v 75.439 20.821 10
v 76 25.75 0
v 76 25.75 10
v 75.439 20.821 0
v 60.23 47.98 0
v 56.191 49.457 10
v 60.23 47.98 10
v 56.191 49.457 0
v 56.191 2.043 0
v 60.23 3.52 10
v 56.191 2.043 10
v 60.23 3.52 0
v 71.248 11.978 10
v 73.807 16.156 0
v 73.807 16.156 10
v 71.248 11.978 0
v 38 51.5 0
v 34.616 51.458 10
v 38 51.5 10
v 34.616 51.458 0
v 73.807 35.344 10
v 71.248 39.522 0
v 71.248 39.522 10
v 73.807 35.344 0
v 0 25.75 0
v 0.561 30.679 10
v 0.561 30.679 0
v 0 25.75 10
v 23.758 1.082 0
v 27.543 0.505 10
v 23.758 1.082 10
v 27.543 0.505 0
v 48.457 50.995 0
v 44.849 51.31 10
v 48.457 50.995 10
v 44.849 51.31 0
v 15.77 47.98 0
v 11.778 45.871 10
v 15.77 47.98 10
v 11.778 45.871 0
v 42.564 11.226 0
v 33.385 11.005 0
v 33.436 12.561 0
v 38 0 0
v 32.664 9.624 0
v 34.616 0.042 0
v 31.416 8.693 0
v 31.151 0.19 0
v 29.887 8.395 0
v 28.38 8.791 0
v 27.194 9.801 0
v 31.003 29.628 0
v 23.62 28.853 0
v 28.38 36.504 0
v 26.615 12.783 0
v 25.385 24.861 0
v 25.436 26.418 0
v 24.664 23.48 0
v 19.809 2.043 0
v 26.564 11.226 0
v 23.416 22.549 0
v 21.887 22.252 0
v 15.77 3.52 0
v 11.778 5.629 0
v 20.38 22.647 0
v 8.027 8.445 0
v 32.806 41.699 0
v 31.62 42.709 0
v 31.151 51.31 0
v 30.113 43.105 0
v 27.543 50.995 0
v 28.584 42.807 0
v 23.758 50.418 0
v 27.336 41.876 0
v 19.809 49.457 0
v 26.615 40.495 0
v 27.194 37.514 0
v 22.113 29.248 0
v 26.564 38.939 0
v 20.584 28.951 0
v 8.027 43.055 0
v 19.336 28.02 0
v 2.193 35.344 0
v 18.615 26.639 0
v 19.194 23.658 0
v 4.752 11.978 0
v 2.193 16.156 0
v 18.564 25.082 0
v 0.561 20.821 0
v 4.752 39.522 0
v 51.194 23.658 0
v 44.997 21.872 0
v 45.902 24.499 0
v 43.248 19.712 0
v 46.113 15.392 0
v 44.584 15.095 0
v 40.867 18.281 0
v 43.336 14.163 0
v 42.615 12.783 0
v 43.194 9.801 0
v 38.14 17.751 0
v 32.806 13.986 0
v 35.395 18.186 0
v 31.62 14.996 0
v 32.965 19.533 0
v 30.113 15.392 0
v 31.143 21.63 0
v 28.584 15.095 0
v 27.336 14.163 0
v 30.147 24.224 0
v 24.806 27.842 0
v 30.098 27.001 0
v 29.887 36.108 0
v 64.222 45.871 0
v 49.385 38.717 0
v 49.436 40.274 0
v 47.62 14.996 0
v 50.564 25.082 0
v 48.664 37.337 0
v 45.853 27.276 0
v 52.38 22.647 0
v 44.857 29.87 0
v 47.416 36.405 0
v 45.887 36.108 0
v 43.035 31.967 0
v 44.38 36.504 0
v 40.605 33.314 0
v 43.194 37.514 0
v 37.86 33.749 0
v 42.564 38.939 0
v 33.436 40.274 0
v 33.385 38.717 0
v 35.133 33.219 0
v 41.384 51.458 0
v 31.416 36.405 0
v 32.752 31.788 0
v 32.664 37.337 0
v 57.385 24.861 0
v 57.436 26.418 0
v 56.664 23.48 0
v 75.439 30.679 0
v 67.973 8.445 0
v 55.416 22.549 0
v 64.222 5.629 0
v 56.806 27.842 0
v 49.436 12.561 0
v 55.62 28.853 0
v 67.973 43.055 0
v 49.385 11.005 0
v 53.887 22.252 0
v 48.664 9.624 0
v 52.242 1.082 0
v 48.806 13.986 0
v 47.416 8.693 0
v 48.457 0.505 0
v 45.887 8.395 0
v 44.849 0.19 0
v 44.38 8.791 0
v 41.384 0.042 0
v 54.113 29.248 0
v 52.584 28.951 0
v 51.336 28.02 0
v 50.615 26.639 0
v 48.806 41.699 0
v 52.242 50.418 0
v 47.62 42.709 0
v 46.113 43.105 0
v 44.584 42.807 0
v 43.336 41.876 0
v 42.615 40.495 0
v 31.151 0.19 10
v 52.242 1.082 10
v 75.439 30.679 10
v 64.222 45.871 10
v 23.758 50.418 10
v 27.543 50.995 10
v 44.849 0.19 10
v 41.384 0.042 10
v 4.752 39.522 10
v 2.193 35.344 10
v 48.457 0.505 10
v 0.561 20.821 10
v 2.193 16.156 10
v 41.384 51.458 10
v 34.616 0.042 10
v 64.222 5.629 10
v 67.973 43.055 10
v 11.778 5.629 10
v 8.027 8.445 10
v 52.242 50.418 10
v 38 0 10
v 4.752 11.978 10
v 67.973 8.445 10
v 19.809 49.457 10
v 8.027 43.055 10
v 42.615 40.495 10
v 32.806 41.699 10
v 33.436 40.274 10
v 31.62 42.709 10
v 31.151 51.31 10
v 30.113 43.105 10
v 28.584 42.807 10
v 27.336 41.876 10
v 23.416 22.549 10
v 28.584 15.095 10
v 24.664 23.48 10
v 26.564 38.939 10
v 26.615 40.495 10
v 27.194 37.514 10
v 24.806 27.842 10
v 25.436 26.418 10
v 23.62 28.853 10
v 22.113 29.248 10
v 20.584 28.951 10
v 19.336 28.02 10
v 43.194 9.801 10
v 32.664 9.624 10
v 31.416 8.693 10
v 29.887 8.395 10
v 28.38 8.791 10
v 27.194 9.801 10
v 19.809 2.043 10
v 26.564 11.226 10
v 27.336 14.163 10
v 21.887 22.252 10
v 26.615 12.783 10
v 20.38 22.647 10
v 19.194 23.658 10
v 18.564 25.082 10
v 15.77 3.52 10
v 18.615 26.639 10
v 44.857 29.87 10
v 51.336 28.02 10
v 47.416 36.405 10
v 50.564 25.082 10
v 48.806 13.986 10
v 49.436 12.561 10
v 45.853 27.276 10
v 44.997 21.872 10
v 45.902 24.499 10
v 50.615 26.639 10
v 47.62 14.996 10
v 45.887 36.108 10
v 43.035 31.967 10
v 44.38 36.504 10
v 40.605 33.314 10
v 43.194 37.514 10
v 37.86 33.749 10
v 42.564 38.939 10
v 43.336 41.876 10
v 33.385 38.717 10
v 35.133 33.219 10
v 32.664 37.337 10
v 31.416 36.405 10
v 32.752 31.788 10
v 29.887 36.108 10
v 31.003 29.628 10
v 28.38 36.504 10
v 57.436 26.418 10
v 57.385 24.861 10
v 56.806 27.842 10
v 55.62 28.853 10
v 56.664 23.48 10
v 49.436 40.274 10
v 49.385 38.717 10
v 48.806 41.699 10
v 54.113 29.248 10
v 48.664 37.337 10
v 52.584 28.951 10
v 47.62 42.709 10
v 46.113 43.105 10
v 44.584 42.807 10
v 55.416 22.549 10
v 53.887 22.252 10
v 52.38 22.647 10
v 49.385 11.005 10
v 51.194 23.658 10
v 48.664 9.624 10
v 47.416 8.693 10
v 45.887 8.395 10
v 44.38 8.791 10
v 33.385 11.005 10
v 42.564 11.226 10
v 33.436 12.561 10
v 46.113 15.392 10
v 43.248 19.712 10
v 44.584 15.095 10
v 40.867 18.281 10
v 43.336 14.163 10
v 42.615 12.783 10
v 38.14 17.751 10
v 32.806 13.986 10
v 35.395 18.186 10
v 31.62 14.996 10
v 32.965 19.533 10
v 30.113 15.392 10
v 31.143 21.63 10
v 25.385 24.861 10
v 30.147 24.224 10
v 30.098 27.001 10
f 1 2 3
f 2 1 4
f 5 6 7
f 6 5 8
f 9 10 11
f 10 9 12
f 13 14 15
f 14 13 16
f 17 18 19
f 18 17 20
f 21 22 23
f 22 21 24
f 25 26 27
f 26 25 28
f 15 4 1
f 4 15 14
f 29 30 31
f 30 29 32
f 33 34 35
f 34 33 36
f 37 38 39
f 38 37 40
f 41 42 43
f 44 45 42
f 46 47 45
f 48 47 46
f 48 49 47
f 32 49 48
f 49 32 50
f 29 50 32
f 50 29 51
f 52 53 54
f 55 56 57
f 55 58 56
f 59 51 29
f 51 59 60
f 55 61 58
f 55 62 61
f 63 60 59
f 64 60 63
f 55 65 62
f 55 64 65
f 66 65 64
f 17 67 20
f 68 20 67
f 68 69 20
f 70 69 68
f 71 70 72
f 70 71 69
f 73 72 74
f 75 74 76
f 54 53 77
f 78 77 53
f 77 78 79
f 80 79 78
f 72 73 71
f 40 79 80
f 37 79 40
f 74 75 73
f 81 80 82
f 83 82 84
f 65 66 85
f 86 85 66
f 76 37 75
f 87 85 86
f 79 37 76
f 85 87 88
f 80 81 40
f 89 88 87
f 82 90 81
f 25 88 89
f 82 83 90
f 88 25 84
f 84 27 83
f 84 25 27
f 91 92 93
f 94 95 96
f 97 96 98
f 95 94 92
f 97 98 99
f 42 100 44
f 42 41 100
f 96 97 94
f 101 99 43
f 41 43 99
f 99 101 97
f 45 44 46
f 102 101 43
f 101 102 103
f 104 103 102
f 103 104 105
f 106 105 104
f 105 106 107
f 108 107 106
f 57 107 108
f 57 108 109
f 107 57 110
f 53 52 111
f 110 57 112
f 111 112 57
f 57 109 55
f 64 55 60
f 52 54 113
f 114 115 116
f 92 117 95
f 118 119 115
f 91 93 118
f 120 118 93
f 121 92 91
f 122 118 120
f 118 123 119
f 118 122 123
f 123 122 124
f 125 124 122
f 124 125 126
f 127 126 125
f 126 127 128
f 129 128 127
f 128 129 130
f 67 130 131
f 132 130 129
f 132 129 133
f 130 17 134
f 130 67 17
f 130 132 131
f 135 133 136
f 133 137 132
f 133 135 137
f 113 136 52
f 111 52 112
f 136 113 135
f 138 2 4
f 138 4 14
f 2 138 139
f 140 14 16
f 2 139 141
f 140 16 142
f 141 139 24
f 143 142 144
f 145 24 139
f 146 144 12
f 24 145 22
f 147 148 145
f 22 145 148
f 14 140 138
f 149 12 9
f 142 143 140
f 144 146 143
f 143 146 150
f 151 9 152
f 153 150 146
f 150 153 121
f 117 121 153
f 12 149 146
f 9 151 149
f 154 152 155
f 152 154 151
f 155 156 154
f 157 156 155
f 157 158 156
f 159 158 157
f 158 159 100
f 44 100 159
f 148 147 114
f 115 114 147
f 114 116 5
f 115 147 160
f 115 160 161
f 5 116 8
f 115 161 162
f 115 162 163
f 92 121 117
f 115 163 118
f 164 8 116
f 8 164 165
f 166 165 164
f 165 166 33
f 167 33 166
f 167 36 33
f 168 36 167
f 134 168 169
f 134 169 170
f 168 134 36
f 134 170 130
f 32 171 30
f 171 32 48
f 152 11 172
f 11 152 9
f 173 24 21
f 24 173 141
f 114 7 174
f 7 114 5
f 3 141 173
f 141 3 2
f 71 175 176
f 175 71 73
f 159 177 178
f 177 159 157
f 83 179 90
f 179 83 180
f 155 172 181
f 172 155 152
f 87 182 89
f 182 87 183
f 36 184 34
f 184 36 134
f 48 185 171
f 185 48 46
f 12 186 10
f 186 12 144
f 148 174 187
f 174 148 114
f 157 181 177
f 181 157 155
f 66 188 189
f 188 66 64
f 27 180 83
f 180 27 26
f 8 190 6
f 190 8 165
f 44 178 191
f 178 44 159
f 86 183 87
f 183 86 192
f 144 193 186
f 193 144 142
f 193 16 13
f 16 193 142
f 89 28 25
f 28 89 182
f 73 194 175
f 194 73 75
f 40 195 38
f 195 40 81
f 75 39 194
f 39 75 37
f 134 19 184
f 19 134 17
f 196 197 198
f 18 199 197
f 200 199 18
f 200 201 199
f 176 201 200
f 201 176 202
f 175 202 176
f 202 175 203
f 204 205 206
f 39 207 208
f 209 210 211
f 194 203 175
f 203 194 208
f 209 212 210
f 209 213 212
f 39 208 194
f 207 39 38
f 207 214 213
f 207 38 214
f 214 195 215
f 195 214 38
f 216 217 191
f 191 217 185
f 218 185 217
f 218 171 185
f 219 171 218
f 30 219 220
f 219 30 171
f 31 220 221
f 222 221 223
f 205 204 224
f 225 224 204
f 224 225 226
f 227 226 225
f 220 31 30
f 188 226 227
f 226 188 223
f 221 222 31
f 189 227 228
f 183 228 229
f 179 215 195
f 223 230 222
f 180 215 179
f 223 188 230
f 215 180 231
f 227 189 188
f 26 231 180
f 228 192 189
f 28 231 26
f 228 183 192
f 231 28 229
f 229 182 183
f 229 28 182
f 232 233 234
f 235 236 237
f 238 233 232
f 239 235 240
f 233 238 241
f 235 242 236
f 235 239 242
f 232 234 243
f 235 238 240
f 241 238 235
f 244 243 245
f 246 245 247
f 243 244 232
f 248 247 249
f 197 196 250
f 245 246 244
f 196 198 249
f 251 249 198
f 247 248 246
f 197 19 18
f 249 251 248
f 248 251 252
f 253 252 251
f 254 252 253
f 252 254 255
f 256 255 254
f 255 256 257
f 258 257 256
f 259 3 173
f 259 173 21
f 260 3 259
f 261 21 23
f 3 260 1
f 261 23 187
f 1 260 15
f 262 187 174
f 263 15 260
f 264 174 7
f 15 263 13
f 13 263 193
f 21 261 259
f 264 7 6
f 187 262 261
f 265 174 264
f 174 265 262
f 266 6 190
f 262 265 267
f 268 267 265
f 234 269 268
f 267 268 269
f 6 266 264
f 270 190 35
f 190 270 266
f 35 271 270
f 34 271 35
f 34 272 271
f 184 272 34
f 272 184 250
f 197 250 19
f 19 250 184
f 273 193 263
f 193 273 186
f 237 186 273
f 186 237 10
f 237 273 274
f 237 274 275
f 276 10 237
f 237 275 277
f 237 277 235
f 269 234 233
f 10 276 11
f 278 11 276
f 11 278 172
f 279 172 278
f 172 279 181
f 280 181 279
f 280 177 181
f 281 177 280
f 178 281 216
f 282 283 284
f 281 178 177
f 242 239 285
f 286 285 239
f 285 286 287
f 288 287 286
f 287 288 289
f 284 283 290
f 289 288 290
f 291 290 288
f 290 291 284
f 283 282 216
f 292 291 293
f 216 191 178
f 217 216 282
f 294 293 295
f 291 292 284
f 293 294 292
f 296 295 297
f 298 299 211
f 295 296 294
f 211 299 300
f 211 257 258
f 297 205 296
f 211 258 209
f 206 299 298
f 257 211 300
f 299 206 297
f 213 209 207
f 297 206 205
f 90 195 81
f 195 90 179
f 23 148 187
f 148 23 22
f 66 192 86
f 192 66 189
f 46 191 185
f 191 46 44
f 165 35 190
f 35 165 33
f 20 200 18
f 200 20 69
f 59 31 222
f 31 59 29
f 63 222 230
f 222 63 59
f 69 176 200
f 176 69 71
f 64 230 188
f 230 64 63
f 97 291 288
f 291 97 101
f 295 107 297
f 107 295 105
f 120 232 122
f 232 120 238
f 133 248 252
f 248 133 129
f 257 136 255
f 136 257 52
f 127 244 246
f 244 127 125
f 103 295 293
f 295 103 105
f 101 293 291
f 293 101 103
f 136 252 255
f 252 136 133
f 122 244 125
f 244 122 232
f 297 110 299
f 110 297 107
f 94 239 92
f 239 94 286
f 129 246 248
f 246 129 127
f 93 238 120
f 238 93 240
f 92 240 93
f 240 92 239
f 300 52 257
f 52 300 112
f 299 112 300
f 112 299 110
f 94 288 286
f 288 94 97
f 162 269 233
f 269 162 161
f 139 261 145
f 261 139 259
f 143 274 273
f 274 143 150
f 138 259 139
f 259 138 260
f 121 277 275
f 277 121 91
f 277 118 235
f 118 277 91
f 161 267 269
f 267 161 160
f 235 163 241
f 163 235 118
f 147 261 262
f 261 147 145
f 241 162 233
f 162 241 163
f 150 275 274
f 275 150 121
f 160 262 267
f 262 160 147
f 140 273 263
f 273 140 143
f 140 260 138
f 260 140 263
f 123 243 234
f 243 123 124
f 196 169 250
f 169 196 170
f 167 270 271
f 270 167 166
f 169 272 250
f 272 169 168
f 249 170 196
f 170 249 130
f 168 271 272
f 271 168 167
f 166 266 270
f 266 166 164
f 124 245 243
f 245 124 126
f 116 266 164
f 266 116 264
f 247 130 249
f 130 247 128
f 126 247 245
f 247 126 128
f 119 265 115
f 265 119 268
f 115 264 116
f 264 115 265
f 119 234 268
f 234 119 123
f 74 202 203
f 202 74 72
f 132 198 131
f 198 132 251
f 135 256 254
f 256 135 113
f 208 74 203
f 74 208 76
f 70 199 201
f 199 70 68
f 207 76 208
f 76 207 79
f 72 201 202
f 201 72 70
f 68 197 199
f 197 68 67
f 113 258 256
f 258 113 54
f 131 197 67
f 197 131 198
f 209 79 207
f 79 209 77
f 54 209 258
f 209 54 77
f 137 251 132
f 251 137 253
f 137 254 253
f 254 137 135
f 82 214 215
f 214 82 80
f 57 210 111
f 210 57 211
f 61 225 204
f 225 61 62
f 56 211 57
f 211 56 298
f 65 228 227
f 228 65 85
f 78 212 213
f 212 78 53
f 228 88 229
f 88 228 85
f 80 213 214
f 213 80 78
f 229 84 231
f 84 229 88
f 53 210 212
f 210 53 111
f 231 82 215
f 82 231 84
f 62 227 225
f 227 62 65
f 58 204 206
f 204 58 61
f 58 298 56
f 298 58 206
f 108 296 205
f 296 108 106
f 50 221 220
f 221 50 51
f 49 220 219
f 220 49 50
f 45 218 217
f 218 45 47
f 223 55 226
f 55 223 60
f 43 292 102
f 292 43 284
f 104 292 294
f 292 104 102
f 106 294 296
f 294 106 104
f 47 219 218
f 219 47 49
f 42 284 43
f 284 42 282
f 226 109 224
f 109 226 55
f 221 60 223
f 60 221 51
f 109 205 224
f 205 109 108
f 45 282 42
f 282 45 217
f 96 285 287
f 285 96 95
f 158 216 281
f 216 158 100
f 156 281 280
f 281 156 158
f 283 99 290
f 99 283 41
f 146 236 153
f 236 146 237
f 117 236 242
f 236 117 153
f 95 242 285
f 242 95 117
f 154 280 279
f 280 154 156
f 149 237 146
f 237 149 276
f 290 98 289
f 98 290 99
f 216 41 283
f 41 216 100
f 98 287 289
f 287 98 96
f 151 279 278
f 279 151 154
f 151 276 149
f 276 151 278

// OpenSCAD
$fn = 32;

// ----------------------------------------------------------------------
// Cam plate: double_lobe cam, base R24
// ----------------------------------------------------------------------

// --- parameters (mm) ---
base_r = 24;              // base circle radius
lobe_h = 14;              // cam lobe rise
bore_r = 8;               // shaft bore radius
plate_t = 10;             // plate thickness, Z (extrusion height)
ring_r = 16;              // lightening ring radius
bolt_r = 3.5;             // lightening hole radius

profile = [[76, 25.75], [75.439, 30.679], [73.807, 35.344], [71.248, 39.522], [67.973, 43.055], [64.222, 45.871], [60.23, 47.98], [56.191, 49.457], [52.242, 50.418], [48.457, 50.995], [44.849, 51.31], [41.384, 51.458], [38, 51.5], [34.616, 51.458], [31.151, 51.31], [27.543, 50.995], [23.758, 50.418], [19.809, 49.457], [15.77, 47.98], [11.778, 45.871], [8.027, 43.055], [4.752, 39.522], [2.193, 35.344], [0.561, 30.679], [0, 25.75], [0.561, 20.821], [2.193, 16.156], [4.752, 11.978], [8.027, 8.445], [11.778, 5.629], [15.77, 3.52], [19.809, 2.043], [23.758, 1.082], [27.543, 0.505], [31.151, 0.19], [34.616, 0.042], [38, 0], [41.384, 0.042], [44.849, 0.19], [48.457, 0.505], [52.242, 1.082], [56.191, 2.043], [60.23, 3.52], [64.222, 5.629], [67.973, 8.445], [71.248, 11.978], [73.807, 16.156], [75.439, 20.821]];  // primary outline, 48 points, counter clockwise
void_1 = [[45.853, 27.276], [44.857, 29.87], [43.035, 31.967], [40.605, 33.314], [37.86, 33.749], [35.133, 33.219], [32.752, 31.788], [31.003, 29.628], [30.098, 27.001], [30.147, 24.224], [31.143, 21.63], [32.965, 19.533], [35.395, 18.186], [38.14, 17.751], [40.867, 18.281], [43.248, 19.712], [44.997, 21.872], [45.902, 24.499]];  // shaft bore, 18 points
void_2 = [[57.436, 26.418], [56.806, 27.842], [55.62, 28.853], [54.113, 29.248], [52.584, 28.951], [51.336, 28.02], [50.615, 26.639], [50.564, 25.082], [51.194, 23.658], [52.38, 22.647], [53.887, 22.252], [55.416, 22.549], [56.664, 23.48], [57.385, 24.861]];  // lightening hole 1, 14 points
void_3 = [[49.436, 40.274], [48.806, 41.699], [47.62, 42.709], [46.113, 43.105], [44.584, 42.807], [43.336, 41.876], [42.615, 40.495], [42.564, 38.939], [43.194, 37.514], [44.38, 36.504], [45.887, 36.108], [47.416, 36.405], [48.664, 37.337], [49.385, 38.717]];  // lightening hole 2, 14 points
void_4 = [[33.436, 40.274], [32.806, 41.699], [31.62, 42.709], [30.113, 43.105], [28.584, 42.807], [27.336, 41.876], [26.615, 40.495], [26.564, 38.939], [27.194, 37.514], [28.38, 36.504], [29.887, 36.108], [31.416, 36.405], [32.664, 37.337], [33.385, 38.717]];  // lightening hole 3, 14 points
void_5 = [[25.436, 26.418], [24.806, 27.842], [23.62, 28.853], [22.113, 29.248], [20.584, 28.951], [19.336, 28.02], [18.615, 26.639], [18.564, 25.082], [19.194, 23.658], [20.38, 22.647], [21.887, 22.252], [23.416, 22.549], [24.664, 23.48], [25.385, 24.861]];  // lightening hole 4, 14 points
void_6 = [[33.436, 12.561], [32.806, 13.986], [31.62, 14.996], [30.113, 15.392], [28.584, 15.095], [27.336, 14.163], [26.615, 12.783], [26.564, 11.226], [27.194, 9.801], [28.38, 8.791], [29.887, 8.395], [31.416, 8.693], [32.664, 9.624], [33.385, 11.005]];  // lightening hole 5, 14 points
void_7 = [[49.436, 12.561], [48.806, 13.986], [47.62, 14.996], [46.113, 15.392], [44.584, 15.095], [43.336, 14.163], [42.615, 12.783], [42.564, 11.226], [43.194, 9.801], [44.38, 8.791], [45.887, 8.395], [47.416, 8.693], [48.664, 9.624], [49.385, 11.005]];  // lightening hole 6, 14 points

// --- the one profile operation ---
difference() {
  linear_extrude(height = plate_t) polygon(points = profile);
  translate([0, 0, -1])
    linear_extrude(height = plate_t + 2) polygon(points = void_1);
  translate([0, 0, -1])
    linear_extrude(height = plate_t + 2) polygon(points = void_2);
  translate([0, 0, -1])
    linear_extrude(height = plate_t + 2) polygon(points = void_3);
  translate([0, 0, -1])
    linear_extrude(height = plate_t + 2) polygon(points = void_4);
  translate([0, 0, -1])
    linear_extrude(height = plate_t + 2) polygon(points = void_5);
  translate([0, 0, -1])
    linear_extrude(height = plate_t + 2) polygon(points = void_6);
  translate([0, 0, -1])
    linear_extrude(height = plate_t + 2) polygon(points = void_7);
}
